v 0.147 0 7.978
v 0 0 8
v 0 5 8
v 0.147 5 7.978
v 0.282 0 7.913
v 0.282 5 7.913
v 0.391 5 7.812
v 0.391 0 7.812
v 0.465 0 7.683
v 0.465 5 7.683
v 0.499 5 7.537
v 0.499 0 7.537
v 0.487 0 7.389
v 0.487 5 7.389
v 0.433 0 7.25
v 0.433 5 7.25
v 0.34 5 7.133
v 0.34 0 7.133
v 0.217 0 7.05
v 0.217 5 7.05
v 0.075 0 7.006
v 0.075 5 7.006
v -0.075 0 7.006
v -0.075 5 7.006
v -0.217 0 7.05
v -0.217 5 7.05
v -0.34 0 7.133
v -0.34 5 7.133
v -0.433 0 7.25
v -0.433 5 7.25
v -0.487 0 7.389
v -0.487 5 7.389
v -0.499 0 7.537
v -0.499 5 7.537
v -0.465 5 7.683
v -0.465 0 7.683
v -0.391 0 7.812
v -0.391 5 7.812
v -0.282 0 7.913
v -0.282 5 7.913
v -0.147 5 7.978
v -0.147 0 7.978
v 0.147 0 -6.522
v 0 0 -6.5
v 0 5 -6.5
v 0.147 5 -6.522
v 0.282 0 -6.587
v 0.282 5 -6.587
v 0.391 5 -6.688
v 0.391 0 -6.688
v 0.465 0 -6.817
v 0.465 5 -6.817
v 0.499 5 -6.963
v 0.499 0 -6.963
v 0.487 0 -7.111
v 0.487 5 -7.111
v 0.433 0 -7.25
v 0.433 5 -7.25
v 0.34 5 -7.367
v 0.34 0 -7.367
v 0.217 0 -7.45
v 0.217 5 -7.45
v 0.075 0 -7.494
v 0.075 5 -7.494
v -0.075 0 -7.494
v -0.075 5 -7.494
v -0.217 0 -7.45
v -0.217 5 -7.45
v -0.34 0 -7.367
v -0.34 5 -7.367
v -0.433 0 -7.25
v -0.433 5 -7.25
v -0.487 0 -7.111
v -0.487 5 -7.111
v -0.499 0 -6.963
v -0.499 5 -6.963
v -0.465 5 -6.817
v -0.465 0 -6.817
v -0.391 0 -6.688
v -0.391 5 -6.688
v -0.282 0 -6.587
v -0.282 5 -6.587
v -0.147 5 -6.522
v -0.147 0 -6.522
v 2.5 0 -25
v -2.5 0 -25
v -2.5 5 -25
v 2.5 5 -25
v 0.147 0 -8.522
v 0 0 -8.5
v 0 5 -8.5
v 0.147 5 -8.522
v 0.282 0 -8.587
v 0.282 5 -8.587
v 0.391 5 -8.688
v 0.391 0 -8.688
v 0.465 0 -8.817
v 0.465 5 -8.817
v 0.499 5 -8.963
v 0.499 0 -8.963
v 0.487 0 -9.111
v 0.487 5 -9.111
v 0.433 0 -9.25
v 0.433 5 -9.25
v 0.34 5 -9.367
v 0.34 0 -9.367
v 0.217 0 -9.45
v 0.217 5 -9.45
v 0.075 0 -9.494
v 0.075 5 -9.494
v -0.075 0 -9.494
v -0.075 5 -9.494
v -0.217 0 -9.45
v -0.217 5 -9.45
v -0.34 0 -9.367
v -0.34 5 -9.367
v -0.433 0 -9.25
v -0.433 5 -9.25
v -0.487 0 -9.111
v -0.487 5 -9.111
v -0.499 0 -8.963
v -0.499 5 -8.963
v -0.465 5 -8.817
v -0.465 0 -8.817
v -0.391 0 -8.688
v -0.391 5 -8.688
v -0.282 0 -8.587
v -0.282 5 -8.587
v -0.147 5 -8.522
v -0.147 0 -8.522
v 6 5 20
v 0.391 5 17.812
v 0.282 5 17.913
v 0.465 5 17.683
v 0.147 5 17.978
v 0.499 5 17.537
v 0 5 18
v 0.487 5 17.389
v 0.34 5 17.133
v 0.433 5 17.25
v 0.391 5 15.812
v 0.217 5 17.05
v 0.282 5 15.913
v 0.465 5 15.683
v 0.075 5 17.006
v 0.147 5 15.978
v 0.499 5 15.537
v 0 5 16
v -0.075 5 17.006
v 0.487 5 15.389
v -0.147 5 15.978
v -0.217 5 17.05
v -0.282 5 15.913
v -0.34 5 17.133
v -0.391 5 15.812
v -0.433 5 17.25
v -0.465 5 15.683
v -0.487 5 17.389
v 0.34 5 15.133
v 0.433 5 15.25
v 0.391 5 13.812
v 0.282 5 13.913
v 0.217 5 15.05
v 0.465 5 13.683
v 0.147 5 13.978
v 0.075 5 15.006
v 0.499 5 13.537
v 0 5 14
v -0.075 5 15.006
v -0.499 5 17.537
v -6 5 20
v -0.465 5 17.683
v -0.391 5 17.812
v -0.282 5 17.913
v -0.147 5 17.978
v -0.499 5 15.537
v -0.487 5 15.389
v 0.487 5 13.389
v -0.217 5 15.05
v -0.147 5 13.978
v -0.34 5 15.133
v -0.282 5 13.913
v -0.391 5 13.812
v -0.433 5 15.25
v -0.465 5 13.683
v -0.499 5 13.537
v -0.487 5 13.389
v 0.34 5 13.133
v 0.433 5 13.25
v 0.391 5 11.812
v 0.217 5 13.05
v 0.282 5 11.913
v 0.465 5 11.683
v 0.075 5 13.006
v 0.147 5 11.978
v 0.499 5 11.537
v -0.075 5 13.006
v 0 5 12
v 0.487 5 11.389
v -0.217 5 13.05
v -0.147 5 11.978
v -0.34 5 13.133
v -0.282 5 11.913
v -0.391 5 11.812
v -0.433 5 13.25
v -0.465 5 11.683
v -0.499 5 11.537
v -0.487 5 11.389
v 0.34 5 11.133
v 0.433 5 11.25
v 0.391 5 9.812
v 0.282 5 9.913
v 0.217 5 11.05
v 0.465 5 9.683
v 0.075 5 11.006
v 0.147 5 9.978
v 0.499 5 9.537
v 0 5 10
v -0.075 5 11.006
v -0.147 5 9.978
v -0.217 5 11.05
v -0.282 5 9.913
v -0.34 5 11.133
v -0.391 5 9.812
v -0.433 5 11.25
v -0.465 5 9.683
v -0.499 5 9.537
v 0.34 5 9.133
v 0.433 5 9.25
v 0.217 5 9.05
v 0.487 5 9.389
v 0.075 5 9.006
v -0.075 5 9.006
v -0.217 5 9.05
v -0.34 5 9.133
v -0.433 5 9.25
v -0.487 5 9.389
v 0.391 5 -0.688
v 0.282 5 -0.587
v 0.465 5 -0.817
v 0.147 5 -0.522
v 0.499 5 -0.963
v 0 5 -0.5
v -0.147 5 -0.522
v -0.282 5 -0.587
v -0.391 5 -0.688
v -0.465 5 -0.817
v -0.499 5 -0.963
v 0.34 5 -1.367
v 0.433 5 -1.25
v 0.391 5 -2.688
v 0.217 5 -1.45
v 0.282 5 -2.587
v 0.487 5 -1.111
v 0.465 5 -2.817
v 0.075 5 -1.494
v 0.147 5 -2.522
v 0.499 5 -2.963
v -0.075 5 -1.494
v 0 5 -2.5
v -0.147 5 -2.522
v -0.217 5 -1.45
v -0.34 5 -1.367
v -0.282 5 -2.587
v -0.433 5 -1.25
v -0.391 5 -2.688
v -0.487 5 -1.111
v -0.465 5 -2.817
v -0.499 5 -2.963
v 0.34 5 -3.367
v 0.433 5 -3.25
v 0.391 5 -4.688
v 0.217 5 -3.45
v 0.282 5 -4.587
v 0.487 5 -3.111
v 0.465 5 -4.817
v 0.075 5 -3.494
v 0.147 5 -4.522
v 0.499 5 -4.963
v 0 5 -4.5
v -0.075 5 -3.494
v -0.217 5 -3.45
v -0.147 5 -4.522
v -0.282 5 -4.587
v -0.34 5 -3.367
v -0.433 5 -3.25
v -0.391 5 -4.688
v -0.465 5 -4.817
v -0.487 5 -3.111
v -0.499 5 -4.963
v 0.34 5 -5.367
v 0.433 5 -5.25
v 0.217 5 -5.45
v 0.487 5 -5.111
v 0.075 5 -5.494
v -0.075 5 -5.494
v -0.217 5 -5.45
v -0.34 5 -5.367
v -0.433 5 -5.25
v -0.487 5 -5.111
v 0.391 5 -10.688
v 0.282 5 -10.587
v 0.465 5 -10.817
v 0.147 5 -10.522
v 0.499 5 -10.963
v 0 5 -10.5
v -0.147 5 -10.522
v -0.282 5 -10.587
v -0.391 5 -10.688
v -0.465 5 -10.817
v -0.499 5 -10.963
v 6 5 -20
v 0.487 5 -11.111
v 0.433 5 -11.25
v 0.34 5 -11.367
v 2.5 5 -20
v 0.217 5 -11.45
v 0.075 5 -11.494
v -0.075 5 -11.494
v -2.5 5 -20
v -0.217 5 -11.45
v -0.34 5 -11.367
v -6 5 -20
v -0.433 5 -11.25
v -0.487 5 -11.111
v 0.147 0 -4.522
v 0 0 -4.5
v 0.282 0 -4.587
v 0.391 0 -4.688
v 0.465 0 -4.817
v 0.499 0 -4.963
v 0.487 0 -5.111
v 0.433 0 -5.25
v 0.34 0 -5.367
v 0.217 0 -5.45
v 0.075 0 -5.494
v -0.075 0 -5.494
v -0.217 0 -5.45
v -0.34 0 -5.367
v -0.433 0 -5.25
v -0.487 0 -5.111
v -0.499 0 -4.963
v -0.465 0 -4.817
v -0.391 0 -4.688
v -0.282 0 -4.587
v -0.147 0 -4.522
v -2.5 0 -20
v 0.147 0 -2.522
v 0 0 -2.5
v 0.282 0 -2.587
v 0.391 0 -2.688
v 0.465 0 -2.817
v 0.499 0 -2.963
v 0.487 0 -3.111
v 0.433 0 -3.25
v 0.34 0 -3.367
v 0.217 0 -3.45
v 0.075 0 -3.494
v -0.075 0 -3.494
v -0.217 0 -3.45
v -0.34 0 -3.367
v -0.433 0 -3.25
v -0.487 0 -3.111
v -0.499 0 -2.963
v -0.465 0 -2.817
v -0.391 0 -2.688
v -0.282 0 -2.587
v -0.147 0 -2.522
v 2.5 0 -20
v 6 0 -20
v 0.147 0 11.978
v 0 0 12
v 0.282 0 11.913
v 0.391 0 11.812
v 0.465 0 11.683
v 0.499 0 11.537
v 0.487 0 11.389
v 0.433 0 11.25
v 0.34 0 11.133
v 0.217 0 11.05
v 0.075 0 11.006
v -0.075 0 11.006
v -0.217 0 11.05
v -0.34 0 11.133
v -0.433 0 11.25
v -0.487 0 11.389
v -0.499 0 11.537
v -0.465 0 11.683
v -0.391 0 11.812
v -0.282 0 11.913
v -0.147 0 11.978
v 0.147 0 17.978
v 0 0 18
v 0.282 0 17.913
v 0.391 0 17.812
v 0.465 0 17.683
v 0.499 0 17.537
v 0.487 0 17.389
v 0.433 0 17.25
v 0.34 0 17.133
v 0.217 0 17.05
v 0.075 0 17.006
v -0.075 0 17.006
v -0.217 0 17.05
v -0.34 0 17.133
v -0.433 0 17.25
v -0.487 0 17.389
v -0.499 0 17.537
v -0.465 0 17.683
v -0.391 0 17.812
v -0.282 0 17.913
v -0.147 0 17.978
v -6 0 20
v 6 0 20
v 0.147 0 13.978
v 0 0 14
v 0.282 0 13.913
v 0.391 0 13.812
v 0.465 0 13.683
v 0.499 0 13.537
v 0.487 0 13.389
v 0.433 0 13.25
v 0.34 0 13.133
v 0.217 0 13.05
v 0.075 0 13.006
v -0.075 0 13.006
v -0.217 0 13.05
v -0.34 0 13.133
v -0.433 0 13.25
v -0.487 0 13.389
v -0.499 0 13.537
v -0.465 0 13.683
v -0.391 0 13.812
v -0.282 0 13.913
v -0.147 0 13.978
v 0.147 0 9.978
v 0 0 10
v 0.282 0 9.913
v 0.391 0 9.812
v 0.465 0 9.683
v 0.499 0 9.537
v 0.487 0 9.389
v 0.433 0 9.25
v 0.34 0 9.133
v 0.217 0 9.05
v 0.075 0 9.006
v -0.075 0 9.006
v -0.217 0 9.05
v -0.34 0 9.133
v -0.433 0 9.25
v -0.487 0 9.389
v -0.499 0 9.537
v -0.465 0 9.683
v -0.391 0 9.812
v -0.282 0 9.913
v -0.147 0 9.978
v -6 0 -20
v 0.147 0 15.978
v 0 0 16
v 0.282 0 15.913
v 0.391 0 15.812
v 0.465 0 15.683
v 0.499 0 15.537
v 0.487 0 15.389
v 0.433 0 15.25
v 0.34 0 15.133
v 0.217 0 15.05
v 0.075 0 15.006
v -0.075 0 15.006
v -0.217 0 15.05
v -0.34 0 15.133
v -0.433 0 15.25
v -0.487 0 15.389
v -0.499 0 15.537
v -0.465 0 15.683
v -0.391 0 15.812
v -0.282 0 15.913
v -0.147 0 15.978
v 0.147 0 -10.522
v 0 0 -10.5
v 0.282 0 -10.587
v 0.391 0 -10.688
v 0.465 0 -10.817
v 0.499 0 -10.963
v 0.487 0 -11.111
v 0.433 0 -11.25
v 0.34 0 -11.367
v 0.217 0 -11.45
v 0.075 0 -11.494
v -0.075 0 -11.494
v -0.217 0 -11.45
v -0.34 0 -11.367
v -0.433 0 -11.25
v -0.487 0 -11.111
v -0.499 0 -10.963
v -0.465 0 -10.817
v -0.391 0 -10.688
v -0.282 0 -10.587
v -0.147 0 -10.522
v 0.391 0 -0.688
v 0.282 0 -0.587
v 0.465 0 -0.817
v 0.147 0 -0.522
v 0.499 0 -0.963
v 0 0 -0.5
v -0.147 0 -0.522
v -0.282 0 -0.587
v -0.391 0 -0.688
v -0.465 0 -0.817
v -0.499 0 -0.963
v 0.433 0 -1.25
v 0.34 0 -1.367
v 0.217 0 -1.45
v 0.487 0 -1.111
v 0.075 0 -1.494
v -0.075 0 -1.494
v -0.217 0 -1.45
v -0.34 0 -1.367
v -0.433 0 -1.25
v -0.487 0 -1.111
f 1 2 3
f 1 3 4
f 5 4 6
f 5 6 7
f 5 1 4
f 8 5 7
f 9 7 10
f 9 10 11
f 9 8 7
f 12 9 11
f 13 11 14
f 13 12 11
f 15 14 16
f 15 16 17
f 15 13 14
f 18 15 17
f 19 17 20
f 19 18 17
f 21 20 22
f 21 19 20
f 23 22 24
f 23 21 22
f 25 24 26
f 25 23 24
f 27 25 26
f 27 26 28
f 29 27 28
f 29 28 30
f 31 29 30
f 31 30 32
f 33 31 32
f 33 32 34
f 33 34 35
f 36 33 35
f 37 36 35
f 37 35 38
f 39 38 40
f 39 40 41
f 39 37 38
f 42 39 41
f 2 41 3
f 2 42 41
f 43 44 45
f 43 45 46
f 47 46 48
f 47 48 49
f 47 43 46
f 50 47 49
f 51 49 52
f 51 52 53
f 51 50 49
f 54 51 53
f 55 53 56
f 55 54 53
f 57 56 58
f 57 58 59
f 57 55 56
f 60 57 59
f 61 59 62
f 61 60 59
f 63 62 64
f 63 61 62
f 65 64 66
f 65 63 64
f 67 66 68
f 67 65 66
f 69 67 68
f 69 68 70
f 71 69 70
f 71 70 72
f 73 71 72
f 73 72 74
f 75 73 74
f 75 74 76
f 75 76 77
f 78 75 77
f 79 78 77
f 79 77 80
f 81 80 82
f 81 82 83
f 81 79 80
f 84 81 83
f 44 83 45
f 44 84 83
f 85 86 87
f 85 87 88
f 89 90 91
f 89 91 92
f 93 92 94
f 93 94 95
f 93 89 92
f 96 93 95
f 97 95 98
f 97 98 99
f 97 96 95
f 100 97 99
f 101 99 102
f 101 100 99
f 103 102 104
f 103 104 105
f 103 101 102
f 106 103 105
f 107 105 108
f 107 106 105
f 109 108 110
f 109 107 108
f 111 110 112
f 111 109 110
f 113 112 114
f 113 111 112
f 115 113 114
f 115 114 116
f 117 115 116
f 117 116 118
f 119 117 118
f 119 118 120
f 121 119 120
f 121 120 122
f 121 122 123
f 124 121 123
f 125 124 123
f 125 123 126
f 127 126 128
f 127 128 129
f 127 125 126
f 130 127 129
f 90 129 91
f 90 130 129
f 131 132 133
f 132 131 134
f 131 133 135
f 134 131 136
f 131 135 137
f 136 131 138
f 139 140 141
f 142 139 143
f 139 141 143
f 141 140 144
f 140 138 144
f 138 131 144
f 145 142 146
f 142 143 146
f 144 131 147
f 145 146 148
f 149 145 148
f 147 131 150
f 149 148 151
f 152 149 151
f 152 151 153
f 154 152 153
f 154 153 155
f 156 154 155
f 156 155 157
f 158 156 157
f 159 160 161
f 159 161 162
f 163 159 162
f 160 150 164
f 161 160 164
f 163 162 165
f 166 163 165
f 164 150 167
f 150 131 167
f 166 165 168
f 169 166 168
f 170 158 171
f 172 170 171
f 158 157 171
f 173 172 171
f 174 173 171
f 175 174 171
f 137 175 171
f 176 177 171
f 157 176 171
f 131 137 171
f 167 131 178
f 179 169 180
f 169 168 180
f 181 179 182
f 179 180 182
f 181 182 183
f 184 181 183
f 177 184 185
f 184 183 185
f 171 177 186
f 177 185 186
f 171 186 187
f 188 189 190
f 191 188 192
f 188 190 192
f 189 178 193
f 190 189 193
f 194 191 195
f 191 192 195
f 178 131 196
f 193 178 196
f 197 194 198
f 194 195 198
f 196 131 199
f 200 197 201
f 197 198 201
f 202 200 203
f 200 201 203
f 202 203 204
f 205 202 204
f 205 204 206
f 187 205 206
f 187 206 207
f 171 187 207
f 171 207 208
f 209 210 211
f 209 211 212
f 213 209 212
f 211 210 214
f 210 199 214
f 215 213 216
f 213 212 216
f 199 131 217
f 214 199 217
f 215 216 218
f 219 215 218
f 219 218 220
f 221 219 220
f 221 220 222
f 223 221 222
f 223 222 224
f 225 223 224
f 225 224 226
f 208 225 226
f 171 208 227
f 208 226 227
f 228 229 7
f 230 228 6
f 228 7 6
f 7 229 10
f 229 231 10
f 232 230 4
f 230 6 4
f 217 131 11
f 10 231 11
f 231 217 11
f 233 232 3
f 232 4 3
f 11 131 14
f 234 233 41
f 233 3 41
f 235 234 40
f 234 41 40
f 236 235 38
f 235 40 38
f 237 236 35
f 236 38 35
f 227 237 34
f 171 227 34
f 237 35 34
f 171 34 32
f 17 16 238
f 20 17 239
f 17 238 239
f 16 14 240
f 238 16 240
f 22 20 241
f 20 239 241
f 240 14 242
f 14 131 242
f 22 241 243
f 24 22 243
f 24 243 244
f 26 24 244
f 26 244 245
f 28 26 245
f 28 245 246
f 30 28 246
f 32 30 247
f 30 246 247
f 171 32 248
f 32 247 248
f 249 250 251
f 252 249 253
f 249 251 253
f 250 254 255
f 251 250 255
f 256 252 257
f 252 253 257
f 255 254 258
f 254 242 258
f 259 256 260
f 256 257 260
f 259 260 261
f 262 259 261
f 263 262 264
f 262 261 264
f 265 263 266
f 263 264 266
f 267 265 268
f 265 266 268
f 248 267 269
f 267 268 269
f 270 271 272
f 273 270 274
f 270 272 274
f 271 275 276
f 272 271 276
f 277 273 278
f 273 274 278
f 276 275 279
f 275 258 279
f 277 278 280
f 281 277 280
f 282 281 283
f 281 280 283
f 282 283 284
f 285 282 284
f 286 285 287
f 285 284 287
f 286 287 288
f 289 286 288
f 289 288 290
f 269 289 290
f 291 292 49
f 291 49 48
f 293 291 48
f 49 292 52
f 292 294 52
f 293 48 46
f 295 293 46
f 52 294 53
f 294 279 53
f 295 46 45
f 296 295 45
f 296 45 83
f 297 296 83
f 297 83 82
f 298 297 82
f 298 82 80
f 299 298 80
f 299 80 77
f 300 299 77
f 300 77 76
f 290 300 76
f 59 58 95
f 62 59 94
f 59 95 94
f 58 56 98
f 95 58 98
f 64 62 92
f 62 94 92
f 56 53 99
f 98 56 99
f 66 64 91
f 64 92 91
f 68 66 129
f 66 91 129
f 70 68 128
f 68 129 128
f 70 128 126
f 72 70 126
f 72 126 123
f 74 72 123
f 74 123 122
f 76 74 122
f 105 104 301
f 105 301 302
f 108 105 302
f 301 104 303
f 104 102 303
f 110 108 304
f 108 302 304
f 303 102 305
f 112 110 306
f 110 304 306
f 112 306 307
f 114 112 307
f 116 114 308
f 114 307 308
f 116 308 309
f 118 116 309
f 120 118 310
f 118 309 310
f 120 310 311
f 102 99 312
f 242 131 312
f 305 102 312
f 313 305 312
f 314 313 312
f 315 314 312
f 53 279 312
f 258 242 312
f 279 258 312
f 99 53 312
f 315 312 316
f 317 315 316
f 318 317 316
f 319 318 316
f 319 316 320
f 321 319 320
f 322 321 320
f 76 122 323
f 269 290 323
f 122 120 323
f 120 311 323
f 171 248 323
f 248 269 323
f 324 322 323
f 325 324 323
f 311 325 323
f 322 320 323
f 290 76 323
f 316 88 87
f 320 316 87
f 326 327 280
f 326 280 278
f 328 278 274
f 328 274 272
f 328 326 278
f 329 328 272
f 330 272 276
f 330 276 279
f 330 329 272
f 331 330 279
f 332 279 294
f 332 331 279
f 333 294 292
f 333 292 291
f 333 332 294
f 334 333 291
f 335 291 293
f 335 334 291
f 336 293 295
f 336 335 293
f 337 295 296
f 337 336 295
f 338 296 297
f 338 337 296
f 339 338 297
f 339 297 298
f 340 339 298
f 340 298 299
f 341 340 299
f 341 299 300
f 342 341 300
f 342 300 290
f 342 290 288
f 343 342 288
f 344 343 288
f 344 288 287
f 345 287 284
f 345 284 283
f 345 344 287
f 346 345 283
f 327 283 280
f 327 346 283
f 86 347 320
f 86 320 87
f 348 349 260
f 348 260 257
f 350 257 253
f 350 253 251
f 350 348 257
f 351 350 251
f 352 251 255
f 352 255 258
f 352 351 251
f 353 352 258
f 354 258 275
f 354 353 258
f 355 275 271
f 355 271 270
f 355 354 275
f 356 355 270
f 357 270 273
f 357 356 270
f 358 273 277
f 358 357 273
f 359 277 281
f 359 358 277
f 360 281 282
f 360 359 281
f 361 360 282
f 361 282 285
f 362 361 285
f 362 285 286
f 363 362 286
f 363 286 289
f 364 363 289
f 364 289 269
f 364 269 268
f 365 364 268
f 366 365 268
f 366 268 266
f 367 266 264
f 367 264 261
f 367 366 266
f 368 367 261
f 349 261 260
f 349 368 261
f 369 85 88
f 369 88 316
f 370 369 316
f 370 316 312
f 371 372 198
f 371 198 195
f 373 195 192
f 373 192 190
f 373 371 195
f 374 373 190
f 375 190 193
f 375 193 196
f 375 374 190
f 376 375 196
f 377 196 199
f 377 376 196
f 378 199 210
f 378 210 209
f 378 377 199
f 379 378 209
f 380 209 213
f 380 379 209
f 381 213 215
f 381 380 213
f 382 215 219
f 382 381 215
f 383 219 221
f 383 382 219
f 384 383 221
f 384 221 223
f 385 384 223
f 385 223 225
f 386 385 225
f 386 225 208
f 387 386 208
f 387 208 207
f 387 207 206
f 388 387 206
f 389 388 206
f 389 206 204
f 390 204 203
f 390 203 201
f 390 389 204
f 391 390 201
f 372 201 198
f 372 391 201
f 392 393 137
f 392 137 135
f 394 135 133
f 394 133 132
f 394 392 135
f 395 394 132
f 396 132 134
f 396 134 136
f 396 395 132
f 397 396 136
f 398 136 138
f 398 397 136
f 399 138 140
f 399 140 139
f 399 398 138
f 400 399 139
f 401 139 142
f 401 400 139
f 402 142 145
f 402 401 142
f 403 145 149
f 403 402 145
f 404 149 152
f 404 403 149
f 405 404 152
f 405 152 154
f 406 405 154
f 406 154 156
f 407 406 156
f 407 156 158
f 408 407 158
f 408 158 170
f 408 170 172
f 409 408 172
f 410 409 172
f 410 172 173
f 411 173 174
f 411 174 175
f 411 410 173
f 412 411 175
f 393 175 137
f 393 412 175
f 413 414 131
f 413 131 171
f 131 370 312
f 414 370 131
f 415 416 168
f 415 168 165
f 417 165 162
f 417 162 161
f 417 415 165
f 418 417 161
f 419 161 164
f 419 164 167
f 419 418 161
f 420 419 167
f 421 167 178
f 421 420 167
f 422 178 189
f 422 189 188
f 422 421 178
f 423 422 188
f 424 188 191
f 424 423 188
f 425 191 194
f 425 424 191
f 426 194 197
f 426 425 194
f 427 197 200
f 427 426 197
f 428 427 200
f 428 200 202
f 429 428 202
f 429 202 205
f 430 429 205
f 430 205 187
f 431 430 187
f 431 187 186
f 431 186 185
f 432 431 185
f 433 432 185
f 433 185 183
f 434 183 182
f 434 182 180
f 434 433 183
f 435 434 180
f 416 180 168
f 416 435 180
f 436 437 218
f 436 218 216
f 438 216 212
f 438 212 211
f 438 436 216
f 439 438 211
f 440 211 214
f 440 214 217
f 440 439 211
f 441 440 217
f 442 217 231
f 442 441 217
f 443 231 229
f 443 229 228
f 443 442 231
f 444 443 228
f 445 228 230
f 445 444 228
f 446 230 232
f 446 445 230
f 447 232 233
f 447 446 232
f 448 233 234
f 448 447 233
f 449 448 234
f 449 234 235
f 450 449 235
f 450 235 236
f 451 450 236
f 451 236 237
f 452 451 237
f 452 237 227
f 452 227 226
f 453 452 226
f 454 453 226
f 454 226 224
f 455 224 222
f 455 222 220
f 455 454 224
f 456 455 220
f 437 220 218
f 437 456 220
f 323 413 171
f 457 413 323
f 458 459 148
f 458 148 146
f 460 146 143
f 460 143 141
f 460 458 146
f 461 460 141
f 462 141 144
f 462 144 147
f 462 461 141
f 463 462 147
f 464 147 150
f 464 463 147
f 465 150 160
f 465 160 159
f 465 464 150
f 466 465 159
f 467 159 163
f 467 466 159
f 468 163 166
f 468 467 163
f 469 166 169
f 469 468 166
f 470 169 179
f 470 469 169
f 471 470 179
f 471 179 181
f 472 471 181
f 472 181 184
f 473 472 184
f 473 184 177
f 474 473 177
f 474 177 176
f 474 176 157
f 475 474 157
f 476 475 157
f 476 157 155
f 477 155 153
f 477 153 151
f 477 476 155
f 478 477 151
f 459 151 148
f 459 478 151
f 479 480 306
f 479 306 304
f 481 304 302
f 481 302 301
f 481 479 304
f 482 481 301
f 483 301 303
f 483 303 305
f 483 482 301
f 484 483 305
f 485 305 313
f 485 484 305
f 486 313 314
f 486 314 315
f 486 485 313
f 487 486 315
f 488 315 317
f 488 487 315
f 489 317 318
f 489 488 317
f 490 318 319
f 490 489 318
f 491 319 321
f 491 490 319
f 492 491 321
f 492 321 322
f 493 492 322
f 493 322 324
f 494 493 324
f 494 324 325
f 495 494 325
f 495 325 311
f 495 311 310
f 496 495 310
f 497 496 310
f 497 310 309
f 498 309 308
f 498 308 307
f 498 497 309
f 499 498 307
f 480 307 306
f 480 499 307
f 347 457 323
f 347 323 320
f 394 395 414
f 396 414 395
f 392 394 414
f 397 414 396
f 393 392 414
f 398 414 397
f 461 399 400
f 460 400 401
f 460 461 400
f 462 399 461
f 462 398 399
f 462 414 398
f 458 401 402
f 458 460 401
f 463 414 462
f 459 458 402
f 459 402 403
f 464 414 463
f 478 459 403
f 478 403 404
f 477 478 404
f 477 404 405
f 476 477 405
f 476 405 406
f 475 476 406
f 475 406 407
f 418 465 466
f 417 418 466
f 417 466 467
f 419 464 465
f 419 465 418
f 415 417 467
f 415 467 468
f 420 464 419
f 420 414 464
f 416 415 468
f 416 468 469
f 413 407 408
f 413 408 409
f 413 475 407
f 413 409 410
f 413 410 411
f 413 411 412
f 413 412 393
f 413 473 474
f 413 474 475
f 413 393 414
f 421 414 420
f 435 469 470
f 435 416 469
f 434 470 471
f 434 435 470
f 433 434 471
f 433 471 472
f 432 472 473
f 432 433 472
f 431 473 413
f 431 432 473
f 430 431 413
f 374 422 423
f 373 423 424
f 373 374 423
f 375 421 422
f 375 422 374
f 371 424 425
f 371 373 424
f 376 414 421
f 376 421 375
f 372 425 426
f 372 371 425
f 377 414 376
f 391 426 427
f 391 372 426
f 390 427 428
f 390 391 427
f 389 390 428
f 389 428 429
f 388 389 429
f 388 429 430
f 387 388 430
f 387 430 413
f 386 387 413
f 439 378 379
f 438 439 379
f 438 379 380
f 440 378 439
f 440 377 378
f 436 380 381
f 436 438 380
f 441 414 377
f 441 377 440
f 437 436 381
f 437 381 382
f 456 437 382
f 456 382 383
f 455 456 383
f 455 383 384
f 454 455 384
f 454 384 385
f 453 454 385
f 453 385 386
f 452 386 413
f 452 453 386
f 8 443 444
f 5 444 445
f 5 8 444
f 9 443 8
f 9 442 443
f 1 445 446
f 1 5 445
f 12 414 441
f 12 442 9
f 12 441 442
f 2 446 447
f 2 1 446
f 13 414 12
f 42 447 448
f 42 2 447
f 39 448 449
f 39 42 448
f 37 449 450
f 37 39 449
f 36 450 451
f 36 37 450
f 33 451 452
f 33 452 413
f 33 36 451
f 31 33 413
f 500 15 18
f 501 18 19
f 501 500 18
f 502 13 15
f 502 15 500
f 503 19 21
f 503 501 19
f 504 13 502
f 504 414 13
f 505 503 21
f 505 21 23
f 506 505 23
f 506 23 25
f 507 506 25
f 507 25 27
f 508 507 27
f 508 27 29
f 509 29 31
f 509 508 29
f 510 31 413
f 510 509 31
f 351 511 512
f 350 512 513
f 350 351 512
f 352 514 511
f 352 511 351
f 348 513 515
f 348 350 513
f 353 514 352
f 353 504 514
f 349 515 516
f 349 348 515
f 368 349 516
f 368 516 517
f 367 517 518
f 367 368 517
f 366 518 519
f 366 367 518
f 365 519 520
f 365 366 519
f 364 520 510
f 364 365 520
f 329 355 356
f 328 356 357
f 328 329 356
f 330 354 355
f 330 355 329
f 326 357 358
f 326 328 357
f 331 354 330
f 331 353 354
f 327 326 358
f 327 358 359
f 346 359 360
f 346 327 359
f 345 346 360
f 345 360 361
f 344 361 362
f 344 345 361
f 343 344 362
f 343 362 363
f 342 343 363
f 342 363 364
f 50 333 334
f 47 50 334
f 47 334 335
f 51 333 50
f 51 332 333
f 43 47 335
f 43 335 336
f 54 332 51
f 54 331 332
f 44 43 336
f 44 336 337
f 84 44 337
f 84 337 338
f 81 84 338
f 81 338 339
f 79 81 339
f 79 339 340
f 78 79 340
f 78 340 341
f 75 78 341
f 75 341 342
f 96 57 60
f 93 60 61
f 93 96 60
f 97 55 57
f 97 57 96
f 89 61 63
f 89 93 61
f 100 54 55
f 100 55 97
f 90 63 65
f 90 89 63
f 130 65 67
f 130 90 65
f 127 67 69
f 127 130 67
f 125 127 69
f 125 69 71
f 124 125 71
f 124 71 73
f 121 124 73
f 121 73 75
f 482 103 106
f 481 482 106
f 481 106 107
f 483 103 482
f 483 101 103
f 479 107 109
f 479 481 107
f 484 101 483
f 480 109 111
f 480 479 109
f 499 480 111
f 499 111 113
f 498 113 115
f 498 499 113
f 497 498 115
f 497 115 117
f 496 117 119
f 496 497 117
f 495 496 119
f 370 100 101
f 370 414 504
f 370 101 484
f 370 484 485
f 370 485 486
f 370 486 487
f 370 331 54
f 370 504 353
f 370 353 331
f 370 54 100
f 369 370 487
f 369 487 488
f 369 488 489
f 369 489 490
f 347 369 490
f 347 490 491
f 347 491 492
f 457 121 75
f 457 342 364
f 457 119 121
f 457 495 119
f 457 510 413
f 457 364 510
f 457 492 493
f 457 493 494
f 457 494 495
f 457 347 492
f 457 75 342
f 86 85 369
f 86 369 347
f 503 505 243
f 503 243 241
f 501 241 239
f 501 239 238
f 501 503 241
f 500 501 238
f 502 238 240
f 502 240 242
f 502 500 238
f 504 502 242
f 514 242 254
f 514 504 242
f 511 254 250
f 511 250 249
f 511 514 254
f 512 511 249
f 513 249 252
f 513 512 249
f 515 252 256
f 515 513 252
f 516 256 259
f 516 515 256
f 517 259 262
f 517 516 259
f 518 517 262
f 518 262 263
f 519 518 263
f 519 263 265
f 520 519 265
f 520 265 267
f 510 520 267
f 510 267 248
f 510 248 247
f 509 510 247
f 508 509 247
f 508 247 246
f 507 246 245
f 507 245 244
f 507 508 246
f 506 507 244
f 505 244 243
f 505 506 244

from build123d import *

# Parameters (mm, degrees)
SKETCH1_R           = 0.5
BOSS_EXTRUDE1_DEPTH = 5


with BuildPart() as part:
    # Sketch1 → Boss-Extrude1 (new body)
    with BuildSketch(Plane(origin=(0, 0, 0), x_dir=(1, 0, 0), z_dir=(0, 1, 0))):
        Polygon((-2.5, 20), (-2.5, 25), (2.5, 25), (2.5, 20), (6, 20), (6, -20), (-6, -20), (-6, 20), align=None)
        with Locations(Location((0, 11, 0), (0, 0, 270))):
            Circle(SKETCH1_R, mode=Mode.SUBTRACT)
        with Locations(Location((0, 9, 0), (0, 0, 270))):
            Circle(SKETCH1_R, mode=Mode.SUBTRACT)
        with Locations(Location((0, 7, 0), (0, 0, 270))):
            Circle(SKETCH1_R, mode=Mode.SUBTRACT)
        with Locations(Location((0, 5, 0), (0, 0, 270))):
            Circle(SKETCH1_R, mode=Mode.SUBTRACT)
        with Locations(Location((0, 3, 0), (0, 0, 270))):
            Circle(SKETCH1_R, mode=Mode.SUBTRACT)
        with Locations(Location((0, 1, 0), (0, 0, 270))):
            Circle(SKETCH1_R, mode=Mode.SUBTRACT)
        with Locations(Location((0, -7.5, 0), (0, 0, 270))):
            Circle(SKETCH1_R, mode=Mode.SUBTRACT)
        with Locations(Location((0, -9.5, 0), (0, 0, 270))):
            Circle(SKETCH1_R, mode=Mode.SUBTRACT)
        with Locations(Location((0, -11.5, 0), (0, 0, 270))):
            Circle(SKETCH1_R, mode=Mode.SUBTRACT)
        with Locations(Location((0, -13.5, 0), (0, 0, 270))):
            Circle(SKETCH1_R, mode=Mode.SUBTRACT)
        with Locations(Location((0, -15.5, 0), (0, 0, 270))):
            Circle(SKETCH1_R, mode=Mode.SUBTRACT)
        with Locations(Location((0, -17.5, 0), (0, 0, 270))):
            Circle(SKETCH1_R, mode=Mode.SUBTRACT)
    extrude(amount=BOSS_EXTRUDE1_DEPTH)


solid = part.part
